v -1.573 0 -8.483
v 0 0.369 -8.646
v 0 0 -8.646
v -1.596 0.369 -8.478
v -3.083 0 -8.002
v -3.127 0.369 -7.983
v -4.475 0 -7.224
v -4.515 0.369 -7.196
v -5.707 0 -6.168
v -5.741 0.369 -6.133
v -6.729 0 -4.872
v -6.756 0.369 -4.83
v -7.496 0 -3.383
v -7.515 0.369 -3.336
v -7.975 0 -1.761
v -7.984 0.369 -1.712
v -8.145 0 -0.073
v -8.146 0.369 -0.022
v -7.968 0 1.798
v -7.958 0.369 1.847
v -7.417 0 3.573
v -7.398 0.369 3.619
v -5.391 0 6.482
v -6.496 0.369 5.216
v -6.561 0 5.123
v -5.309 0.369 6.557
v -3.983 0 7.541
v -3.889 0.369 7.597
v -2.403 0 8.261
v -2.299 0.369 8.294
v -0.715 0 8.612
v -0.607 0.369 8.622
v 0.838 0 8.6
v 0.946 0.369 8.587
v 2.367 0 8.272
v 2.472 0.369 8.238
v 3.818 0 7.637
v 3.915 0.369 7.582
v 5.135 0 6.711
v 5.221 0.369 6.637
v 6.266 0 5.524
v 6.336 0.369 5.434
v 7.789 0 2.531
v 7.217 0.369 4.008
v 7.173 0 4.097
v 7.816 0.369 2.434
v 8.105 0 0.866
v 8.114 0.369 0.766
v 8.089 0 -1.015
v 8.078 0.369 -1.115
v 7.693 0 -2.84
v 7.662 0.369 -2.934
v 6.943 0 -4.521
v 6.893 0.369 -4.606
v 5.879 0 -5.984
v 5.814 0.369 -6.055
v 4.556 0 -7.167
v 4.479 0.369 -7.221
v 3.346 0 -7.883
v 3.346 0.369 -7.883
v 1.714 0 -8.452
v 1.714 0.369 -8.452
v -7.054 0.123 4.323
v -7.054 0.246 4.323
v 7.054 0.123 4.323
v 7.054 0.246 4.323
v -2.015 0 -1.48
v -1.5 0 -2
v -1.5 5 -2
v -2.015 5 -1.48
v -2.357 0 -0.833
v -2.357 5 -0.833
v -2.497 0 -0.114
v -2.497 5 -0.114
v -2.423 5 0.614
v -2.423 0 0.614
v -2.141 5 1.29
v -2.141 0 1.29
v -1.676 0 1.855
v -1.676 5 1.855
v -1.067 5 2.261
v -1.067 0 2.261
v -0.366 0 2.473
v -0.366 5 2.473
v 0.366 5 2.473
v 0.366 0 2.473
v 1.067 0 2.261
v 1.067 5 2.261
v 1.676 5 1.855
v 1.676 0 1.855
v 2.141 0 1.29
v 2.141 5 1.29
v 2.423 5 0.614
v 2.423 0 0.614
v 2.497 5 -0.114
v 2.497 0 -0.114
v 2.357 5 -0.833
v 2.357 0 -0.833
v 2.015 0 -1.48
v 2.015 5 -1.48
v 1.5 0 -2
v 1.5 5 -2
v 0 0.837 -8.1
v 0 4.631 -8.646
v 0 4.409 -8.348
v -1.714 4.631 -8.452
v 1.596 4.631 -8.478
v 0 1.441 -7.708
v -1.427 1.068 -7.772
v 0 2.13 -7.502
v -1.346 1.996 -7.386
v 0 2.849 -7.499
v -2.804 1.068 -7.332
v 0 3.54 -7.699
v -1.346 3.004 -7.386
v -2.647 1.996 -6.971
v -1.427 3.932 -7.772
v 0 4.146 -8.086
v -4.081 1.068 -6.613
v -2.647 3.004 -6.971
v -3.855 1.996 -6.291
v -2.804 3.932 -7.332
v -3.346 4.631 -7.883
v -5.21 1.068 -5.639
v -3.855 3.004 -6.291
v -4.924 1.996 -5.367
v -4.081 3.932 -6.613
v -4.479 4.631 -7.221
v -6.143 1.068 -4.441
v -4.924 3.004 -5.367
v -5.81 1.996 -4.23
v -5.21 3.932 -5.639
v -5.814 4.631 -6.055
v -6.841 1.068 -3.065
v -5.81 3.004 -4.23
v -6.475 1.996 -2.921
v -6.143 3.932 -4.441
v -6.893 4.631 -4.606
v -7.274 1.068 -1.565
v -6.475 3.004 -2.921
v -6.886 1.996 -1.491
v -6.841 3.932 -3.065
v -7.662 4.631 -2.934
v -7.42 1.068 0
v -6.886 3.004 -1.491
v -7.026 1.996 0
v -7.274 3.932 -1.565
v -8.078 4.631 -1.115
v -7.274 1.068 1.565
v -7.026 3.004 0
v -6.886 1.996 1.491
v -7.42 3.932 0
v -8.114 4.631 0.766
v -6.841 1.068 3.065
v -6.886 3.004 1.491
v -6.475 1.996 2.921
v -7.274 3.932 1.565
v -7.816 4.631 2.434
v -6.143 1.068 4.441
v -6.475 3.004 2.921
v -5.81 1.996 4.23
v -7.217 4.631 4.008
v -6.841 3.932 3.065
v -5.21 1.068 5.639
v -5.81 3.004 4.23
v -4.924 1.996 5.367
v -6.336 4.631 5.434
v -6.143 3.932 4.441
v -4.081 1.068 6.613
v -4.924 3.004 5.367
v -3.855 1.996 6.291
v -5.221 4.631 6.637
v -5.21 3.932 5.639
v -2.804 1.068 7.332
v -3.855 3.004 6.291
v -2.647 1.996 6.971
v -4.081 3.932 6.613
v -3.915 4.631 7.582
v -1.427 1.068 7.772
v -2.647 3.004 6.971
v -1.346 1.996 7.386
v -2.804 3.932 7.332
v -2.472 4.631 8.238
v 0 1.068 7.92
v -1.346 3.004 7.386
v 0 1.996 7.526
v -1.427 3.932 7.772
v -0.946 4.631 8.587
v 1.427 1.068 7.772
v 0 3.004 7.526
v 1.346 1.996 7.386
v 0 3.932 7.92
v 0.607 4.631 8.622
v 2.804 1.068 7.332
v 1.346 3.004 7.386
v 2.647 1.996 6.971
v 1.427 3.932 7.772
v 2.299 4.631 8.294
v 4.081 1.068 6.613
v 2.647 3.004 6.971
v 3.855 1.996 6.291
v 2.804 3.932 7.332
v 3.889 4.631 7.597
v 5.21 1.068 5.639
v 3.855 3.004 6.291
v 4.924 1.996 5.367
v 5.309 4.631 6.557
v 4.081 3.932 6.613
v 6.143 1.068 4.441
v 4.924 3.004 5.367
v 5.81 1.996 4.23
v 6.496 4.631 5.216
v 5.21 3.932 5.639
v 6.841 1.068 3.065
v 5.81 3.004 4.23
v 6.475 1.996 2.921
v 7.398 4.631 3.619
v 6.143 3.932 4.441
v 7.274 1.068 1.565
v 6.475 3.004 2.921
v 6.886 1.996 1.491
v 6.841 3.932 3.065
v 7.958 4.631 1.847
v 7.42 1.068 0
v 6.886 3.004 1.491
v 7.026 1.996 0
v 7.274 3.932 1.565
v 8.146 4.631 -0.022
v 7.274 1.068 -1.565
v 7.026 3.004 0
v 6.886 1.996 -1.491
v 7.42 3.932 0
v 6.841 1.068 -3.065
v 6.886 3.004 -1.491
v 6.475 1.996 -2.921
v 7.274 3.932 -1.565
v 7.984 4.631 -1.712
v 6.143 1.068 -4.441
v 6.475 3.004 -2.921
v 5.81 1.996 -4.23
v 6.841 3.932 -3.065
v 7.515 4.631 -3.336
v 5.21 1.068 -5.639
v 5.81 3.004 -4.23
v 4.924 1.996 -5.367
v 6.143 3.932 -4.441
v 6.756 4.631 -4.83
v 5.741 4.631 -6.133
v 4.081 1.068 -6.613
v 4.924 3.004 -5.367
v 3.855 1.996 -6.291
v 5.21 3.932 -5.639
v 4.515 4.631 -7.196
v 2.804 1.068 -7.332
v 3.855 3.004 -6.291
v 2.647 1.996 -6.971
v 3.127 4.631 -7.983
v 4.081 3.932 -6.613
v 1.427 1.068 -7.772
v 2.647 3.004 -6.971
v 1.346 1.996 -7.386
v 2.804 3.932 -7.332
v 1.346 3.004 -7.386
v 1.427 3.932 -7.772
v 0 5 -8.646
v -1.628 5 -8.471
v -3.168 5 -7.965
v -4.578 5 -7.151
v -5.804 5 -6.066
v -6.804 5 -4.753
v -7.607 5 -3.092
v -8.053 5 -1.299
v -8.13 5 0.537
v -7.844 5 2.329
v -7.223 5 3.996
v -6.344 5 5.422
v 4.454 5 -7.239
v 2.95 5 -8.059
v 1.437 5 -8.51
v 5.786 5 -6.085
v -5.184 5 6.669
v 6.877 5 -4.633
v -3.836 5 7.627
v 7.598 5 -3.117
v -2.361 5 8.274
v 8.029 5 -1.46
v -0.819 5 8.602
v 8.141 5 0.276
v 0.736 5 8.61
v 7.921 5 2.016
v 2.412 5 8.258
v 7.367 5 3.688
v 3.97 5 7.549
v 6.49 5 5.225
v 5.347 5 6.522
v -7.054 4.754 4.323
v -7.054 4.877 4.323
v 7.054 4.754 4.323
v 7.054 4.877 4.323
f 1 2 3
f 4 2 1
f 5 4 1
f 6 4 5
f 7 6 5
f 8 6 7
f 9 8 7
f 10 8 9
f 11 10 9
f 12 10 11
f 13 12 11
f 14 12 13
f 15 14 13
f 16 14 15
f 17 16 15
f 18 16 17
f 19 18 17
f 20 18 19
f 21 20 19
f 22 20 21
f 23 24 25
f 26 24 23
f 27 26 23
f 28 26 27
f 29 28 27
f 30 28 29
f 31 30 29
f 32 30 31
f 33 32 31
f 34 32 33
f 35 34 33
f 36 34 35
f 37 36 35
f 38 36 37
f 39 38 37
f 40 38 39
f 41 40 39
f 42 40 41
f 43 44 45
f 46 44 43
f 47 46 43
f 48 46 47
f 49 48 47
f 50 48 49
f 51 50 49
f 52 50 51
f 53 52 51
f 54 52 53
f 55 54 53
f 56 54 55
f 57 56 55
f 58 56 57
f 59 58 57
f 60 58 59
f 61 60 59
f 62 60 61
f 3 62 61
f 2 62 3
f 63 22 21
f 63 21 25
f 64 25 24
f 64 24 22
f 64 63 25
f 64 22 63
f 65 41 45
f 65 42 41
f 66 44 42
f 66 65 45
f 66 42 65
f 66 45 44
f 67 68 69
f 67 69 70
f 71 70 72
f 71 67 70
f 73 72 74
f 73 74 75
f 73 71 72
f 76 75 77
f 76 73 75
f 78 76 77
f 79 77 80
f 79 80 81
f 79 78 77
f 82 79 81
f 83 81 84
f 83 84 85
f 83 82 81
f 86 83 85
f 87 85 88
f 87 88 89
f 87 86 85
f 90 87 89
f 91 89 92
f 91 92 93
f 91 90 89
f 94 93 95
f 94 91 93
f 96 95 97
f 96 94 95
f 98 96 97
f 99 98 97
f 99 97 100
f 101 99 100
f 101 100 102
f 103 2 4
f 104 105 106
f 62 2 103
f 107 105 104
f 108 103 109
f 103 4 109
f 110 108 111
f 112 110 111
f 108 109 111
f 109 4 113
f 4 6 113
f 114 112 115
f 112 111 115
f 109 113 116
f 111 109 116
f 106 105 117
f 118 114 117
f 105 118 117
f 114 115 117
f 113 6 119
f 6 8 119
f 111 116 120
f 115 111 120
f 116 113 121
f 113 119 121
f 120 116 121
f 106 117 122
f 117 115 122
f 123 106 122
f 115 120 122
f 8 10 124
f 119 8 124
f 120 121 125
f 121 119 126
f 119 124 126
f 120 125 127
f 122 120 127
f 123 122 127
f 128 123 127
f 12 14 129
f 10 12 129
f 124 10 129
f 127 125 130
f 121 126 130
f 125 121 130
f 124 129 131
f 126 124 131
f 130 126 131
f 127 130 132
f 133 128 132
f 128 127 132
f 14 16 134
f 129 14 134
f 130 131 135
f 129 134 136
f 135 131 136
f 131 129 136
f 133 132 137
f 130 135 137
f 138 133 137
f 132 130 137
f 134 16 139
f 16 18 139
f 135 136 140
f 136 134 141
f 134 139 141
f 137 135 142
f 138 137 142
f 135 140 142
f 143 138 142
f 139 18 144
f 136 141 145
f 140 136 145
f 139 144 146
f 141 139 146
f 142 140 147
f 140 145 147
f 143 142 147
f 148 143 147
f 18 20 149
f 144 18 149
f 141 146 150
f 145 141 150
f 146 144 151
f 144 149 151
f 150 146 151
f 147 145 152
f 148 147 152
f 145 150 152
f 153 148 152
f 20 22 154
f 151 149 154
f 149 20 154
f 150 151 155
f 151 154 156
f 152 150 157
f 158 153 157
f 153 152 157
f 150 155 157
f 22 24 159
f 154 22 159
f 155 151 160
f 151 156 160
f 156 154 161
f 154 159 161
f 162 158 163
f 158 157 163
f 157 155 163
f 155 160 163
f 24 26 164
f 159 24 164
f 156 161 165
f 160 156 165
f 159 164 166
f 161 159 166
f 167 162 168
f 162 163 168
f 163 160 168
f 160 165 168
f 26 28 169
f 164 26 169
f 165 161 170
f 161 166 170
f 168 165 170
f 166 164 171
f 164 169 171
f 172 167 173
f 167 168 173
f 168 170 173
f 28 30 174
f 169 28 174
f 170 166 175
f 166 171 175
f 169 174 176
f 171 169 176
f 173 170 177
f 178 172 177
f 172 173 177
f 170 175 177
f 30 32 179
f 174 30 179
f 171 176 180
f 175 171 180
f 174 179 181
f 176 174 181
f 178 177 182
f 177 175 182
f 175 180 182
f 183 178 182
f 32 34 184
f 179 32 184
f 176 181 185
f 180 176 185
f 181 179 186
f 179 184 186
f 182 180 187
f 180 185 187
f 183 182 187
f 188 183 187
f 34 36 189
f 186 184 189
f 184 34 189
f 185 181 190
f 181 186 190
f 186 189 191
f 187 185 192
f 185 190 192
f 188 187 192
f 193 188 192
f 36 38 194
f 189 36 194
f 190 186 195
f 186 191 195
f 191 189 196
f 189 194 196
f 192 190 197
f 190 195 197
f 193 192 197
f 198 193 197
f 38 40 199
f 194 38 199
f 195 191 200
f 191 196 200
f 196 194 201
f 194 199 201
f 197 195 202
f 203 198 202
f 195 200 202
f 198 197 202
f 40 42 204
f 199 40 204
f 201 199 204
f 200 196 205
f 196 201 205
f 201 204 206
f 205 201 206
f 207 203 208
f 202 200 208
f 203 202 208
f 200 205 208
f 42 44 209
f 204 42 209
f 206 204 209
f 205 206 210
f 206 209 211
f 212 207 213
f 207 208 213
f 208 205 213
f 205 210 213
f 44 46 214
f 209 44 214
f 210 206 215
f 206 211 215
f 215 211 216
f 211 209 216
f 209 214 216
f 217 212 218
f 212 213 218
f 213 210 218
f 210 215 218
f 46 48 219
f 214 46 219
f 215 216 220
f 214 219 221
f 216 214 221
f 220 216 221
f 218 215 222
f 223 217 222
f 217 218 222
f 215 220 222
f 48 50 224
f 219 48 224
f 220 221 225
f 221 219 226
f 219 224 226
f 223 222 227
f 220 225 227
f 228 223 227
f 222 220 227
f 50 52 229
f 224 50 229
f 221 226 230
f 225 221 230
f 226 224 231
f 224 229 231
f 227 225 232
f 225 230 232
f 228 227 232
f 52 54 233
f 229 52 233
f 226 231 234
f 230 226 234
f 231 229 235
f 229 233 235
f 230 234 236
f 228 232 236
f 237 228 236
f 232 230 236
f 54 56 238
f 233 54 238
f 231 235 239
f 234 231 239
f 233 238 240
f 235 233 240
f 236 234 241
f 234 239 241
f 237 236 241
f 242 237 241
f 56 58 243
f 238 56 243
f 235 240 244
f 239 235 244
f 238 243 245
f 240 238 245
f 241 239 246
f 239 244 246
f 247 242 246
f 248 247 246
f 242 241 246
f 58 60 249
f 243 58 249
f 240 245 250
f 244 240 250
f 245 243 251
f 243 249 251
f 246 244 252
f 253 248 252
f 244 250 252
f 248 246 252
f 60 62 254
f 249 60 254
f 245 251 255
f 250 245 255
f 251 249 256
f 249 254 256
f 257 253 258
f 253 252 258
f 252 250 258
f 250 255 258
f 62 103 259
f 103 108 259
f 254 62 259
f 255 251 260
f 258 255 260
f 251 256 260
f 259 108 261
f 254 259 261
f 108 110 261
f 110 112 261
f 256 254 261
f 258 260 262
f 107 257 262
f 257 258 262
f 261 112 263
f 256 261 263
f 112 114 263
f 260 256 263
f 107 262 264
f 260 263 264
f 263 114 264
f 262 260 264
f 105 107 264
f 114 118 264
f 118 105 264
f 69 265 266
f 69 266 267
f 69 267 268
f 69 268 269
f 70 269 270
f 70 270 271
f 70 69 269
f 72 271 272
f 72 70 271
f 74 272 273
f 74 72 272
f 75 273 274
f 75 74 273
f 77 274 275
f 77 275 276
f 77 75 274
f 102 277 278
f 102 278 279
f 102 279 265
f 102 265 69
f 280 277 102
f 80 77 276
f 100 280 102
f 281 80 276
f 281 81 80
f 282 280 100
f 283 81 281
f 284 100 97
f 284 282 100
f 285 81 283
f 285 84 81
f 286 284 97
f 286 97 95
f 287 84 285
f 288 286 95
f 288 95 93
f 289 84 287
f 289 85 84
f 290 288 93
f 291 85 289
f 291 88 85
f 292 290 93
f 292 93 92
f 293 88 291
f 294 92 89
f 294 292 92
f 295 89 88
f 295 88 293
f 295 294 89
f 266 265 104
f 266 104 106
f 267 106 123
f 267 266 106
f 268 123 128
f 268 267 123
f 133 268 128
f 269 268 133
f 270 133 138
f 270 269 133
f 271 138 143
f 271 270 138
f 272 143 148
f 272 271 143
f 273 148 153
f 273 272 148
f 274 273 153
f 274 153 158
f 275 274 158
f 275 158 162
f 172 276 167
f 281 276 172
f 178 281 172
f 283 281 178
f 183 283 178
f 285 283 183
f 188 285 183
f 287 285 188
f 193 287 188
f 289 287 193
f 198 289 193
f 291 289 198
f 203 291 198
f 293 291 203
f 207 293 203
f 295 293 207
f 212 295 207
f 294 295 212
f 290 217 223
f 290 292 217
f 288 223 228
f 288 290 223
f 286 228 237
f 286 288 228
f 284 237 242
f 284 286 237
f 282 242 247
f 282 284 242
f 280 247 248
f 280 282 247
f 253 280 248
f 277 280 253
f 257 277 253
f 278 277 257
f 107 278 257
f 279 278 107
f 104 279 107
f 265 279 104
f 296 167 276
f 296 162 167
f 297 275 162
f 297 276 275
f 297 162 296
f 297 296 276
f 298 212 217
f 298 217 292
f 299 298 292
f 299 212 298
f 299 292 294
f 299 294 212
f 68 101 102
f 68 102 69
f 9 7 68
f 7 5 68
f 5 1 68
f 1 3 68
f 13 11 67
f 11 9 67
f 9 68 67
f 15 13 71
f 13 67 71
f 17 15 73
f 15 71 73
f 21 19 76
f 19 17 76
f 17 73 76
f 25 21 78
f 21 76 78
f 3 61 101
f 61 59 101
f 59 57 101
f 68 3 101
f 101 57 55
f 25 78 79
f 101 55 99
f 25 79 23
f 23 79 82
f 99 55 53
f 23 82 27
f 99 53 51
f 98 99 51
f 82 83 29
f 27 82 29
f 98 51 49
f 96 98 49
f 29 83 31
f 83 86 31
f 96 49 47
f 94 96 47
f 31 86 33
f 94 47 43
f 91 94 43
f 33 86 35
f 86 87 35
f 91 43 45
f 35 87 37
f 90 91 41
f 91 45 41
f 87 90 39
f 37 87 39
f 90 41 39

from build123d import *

# Parameters (mm, degrees)
SKETCH1_RX           = 10
SKETCH1_RY           = 9.5
BOSS_EXTRUDE1_DEPTH  = 5
CUT_SWEEP3_PROFILE_R = 2.525
CUT_EXTRUDE1_DEPTH   = 10


with BuildPart() as part:
    # Sketch1 → Boss-Extrude1 (new body)
    with BuildSketch(Plane(origin=(0, 0, 0), x_dir=(1, 0, 0), z_dir=(0, 1, 0))):
        with Locations(Location((0, 0), (0, 0, -90))):
            Ellipse(SKETCH1_RX, SKETCH1_RY)
        with BuildLine():
            Line((1.5, 2), (-1.5, 2))
            ThreePointArc((-1.5, 2), (0, -2.5), (1.5, 2))
        make_face(mode=Mode.SUBTRACT)
    extrude(amount=BOSS_EXTRUDE1_DEPTH)

    # Cut-Sweep3: sweep along a path in Sketch2
    with BuildLine(Plane(origin=(0, 2.5, 0), x_dir=(1, 0, 0), z_dir=(0, 1, 0))) as cut_sweep3_path:
        EllipticalCenterArc((0, 0), 10, 9.5, start_angle=0, arc_size=360, rotation=90)
    # Cut-Sweep3 profile (on start of the path) → Cut-Sweep3 (sweep, cut)
    with BuildSketch(Plane(origin=(0, 2.5, -10), x_dir=(0, 0, -1), z_dir=(-1, 0, 0))):
        Circle(CUT_SWEEP3_PROFILE_R)
    sweep(path=cut_sweep3_path.line, mode=Mode.SUBTRACT)

    # Sketch27 → Cut-Extrude1 (cut)
    with BuildSketch(Plane(origin=(0, 5, 0), x_dir=(1, 0, 0), z_dir=(0, 1, 0))):
        with BuildLine():
            add(Edge.make_bspline(
                [(0, 9.645563828), (-0.758503038, 9.645564212), (-1.517286769, 9.565936878), (-2.265269624, 9.406585941), (-2.992455116, 9.170179622), (-3.689674481, 8.860976866), (-4.696144743, 8.287182833), (-5.033026907, 8.070588817), (-5.358216994, 7.836342416), (-5.670696822, 7.585404274), (-5.969566199, 7.318802839), (-6.549656622, 6.745390623), (-6.829730147, 6.43740695), (-7.093360483, 6.114870941), (-7.339798208, 5.779026576), (-7.568414863, 5.431140244), (-7.915330171, 4.839411915), (-8.044227667, 4.601789408), (-8.165234512, 4.359968222), (-8.278225476, 4.114297866), (-8.383092616, 3.865127725), (-8.544534604, 3.443668275), (-8.605632529, 3.273113696), (-8.663011537, 3.101248396), (-8.716647121, 2.92817725), (-8.766517763, 2.75400493), (-8.923174946, 2.158579308), (-9.01196691, 1.732587012), (-9.078724913, 1.302299066), (-9.123283905, 0.869151703), (-9.145563846, 0.434576578), (-9.145564011, -0.615715948), (-9.100839273, -1.23142422), (-9.011395422, -1.843077139), (-8.877549469, -2.446595628), (-8.699974619, -3.037877718), (-8.383092616, -3.865127725), (-8.278225476, -4.114297866), (-8.165234512, -4.359968222), (-8.044227667, -4.601789408), (-7.915330171, -4.839411915), (-7.568414863, -5.431140244), (-7.339798208, -5.779026576), (-7.093360483, -6.114870941), (-6.829730147, -6.43740695), (-6.549656622, -6.745390623), (-5.969566199, -7.318802839), (-5.670696822, -7.585404274), (-5.358216994, -7.836342416), (-5.033026907, -8.070588817), (-4.696144743, -8.287182833), (-4.13905593, -8.604782026), (-3.925549732, -8.717568059), (-3.7084536, -8.823417013), (-3.488032874, -8.922152617), (-3.264566937, -9.013614419), (-2.553432563, -9.27781212), (-2.055830142, -9.423897373), (-1.548503321, -9.534463128), (-1.034563212, -9.608533948), (-0.517259644, -9.645563847), (0.363597835, -9.645563938), (0.727203338, -9.627266619), (1.0896503, -9.590672341), (1.449798692, -9.53590758), (1.806534427, -9.463219718), (2.307638251, -9.334829516), (2.455704757, -9.29355013), (2.602887518, -9.249161075), (2.749107212, -9.201692908), (2.894286337, -9.151179449), (3.264566937, -9.013614419), (3.488032874, -8.922152617), (3.7084536, -8.823417013), (3.925549732, -8.717568059), (4.13905593, -8.604782026), (4.696144743, -8.287182833), (5.033026907, -8.070588817), (5.358216994, -7.836342416), (5.670696822, -7.585404274), (5.969566199, -7.318802839), (6.549656622, -6.745390623), (6.829730147, -6.43740695), (7.093360483, -6.114870941), (7.339798208, -5.779026576), (7.568414863, -5.431140244), (7.915330171, -4.839411915), (8.044227667, -4.601789408), (8.165234512, -4.359968222), (8.278225476, -4.114297866), (8.383092616, -3.865127725), (8.544534604, -3.443668275), (8.605632529, -3.273113696), (8.663011537, -3.101248396), (8.716647121, -2.92817725), (8.766517763, -2.75400493), (8.923174946, -2.158579308), (9.01196691, -1.732587012), (9.078724913, -1.302299066), (9.123283905, -0.869151703), (9.145563846, -0.434576578), (9.145564011, 0.615715948), (9.100839273, 1.23142422), (9.011395422, 1.843077139), (8.877549469, 2.446595628), (8.699974619, 3.037877718), (8.383092616, 3.865127725), (8.278225476, 4.114297866), (8.165234512, 4.359968222), (8.044227667, 4.601789408), (7.915330171, 4.839411915), (7.568414863, 5.431140244), (7.339798208, 5.779026576), (7.093360483, 6.114870941), (6.829730147, 6.43740695), (6.549656622, 6.745390623), (5.969566199, 7.318802839), (5.670696822, 7.585404274), (5.358216994, 7.836342416), (5.033026907, 8.070588817), (4.696144743, 8.287182833), (3.689674481, 8.860976866), (2.992455116, 9.170179622), (2.265269624, 9.406585941), (1.517286769, 9.565936878), (0.758503038, 9.645564212), (0, 9.645563828)],
                knots=[0, 0, 0, 0, 0, 0, 0, 0.077105522, 0.077105522, 0.077105522, 0.077105522, 0.077105522, 0.117752543, 0.117752543, 0.117752543, 0.117752543, 0.117752543, 0.159994987, 0.159994987, 0.159994987, 0.159994987, 0.159994987, 0.187446594, 0.187446594, 0.187446594, 0.187446594, 0.187446594, 0.205848296, 0.205848296, 0.205848296, 0.205848296, 0.205848296, 0.249996723, 0.249996723, 0.249996723, 0.249996723, 0.249996723, 0.312546989, 0.312546989, 0.312546989, 0.312546989, 0.312546989, 0.339998577, 0.339998577, 0.339998577, 0.339998577, 0.339998577, 0.382240994, 0.382240994, 0.382240994, 0.382240994, 0.382240994, 0.422887987, 0.422887987, 0.422887987, 0.422887987, 0.422887987, 0.447417833, 0.447417833, 0.447417833, 0.447417833, 0.447417833, 0.499999598, 0.499999598, 0.499999598, 0.499999598, 0.499999598, 0.536960946, 0.536960946, 0.536960946, 0.536960946, 0.536960946, 0.552582358, 0.552582358, 0.552582358, 0.552582358, 0.552582358, 0.577112212, 0.577112212, 0.577112212, 0.577112212, 0.577112212, 0.617759218, 0.617759218, 0.617759218, 0.617759218, 0.617759218, 0.660001648, 0.660001648, 0.660001648, 0.660001648, 0.660001648, 0.687453245, 0.687453245, 0.687453245, 0.687453245, 0.687453245, 0.705854941, 0.705854941, 0.705854941, 0.705854941, 0.705854941, 0.750003353, 0.750003353, 0.750003353, 0.750003353, 0.750003353, 0.812553596, 0.812553596, 0.812553596, 0.812553596, 0.812553596, 0.840005175, 0.840005175, 0.840005175, 0.840005175, 0.840005175, 0.882247577, 0.882247577, 0.882247577, 0.882247577, 0.882247577, 0.922894556, 0.922894556, 0.922894556, 0.922894556, 0.922894556, 1, 1, 1, 1, 1, 1, 1], degree=6))
        make_face()
        with BuildLine():
            add(Edge.make_bspline(
                [(0, 8.645563828), (-14.108530406, 8.645563828), (-7.054265203, -4.322781914), (0, -17.291127656), (7.054265203, -4.322781914), (14.108530406, 8.645563828), (0, 8.645563828)],
                knots=[0, 0, 0, 2.094395102, 2.094395102, 4.188790205, 4.188790205, 6.283185307, 6.283185307, 6.283185307], degree=2, weights=[1, 0.5, 1, 0.5, 1, 0.5, 1]))
        make_face(mode=Mode.SUBTRACT)
    extrude(amount=-CUT_EXTRUDE1_DEPTH, mode=Mode.SUBTRACT)


solid = part.part
